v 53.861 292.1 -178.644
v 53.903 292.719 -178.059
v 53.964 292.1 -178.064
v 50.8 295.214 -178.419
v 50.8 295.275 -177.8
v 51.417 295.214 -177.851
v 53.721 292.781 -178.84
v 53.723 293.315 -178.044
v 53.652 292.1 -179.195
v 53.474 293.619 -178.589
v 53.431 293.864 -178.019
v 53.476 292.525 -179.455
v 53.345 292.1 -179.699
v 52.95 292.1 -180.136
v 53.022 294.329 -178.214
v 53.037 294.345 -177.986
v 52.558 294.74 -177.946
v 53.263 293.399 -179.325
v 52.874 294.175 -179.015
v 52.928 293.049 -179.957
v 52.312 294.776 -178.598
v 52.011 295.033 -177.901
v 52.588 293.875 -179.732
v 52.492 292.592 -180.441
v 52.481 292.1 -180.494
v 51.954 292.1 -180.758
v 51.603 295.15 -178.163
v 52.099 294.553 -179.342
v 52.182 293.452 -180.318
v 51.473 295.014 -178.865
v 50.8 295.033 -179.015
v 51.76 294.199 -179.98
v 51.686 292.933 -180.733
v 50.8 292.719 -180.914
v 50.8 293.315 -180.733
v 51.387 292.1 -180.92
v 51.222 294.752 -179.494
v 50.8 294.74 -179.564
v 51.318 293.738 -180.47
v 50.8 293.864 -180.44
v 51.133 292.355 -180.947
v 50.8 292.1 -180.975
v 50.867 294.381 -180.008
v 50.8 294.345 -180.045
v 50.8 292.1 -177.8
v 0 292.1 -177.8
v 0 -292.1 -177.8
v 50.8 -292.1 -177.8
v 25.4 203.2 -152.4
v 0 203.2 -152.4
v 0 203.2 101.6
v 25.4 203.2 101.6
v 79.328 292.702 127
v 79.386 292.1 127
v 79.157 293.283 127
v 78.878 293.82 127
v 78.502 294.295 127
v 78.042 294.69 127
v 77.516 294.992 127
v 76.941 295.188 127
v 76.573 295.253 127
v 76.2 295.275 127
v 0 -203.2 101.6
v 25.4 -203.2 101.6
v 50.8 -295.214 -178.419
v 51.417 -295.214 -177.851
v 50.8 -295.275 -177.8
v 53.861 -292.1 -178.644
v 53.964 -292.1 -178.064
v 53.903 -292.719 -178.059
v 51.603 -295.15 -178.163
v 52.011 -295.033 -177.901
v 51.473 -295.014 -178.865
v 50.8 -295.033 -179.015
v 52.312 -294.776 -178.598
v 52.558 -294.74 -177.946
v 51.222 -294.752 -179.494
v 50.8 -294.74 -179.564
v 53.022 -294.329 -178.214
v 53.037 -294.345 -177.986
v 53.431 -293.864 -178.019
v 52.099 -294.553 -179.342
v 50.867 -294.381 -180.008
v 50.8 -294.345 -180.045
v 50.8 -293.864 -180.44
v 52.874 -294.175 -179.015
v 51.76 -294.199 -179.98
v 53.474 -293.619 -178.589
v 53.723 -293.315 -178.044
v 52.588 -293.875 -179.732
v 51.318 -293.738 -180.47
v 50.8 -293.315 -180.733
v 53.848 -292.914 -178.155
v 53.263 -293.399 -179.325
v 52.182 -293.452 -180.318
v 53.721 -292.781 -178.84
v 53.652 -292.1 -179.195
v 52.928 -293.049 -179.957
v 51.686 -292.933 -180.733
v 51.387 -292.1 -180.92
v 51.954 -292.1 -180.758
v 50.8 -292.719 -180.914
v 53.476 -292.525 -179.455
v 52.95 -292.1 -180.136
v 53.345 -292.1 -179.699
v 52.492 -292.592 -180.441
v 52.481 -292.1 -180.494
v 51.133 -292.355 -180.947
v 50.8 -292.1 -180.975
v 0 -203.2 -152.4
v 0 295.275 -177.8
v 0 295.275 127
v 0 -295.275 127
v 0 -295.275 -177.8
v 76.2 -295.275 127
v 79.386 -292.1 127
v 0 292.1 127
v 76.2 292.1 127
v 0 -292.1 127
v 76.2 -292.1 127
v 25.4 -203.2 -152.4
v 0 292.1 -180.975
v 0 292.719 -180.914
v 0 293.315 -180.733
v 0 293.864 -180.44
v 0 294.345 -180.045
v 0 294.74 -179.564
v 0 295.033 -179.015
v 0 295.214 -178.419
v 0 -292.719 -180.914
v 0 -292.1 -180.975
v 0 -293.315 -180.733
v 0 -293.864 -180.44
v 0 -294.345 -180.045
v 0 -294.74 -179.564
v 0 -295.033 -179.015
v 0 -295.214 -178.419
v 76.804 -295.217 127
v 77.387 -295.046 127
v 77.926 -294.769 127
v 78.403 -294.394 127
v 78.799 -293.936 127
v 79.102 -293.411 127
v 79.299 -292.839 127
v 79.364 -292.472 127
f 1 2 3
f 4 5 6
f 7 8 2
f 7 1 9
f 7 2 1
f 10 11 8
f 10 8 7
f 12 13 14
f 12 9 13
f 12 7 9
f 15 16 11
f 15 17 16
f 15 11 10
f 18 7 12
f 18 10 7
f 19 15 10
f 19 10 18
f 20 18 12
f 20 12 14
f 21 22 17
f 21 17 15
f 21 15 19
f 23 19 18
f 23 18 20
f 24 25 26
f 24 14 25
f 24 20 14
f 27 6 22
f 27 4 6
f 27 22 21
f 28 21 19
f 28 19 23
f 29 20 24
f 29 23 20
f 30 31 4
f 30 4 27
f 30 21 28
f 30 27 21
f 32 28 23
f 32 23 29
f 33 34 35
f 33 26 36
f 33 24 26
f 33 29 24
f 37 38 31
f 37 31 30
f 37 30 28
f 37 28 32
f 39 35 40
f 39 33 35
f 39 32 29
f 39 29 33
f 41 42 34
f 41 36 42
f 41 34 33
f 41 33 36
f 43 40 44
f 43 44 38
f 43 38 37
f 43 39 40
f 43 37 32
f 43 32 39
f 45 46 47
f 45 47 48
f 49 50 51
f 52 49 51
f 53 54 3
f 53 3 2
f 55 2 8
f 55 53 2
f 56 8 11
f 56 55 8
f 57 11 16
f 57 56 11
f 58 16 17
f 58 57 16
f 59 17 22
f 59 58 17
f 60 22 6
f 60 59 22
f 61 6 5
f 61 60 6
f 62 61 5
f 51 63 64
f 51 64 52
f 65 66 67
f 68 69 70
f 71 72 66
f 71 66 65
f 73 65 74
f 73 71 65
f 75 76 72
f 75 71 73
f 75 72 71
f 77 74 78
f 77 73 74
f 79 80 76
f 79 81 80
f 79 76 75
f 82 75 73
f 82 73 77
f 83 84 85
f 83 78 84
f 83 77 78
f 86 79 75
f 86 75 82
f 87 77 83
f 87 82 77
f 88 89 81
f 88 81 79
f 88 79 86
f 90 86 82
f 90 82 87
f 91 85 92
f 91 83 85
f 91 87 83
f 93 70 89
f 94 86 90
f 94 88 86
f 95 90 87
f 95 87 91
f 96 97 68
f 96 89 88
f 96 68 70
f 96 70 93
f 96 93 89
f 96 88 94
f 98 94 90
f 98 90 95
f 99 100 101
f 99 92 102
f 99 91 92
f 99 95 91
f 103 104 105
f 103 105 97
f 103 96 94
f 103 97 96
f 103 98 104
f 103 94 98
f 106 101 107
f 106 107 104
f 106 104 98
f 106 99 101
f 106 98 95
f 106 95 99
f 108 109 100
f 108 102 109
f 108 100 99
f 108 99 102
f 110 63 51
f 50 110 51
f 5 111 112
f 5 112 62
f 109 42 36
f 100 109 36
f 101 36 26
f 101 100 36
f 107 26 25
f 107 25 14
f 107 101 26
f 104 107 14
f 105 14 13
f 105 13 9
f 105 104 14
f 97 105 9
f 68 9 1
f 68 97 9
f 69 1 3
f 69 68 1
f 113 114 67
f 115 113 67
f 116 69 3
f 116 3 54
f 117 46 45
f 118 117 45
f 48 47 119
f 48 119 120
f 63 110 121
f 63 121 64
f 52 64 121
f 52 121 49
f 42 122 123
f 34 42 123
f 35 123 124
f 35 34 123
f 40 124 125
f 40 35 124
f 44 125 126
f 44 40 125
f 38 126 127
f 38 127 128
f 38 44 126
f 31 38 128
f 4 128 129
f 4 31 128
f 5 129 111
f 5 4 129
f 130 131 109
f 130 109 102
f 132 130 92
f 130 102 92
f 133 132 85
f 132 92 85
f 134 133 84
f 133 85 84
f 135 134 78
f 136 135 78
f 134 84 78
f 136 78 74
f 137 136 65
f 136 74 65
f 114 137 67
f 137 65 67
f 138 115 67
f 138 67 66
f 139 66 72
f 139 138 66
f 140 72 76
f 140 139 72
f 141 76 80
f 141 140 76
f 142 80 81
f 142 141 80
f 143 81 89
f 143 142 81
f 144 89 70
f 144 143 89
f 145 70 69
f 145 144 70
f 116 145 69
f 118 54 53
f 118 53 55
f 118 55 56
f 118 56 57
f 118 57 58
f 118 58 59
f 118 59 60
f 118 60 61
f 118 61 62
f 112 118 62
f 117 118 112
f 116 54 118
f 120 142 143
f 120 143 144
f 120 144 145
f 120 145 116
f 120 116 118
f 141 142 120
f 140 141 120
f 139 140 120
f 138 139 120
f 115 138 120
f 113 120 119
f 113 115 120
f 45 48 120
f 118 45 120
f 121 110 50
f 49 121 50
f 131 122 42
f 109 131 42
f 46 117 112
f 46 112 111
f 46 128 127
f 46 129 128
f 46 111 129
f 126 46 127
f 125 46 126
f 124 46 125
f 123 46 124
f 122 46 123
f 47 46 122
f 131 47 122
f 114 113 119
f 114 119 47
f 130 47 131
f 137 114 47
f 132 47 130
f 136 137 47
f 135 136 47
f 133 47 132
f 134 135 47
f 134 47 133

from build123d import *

# Parameters (mm, degrees)
SKETCH_W     = 406.4
SKETCH_H     = 254
PAD_DEPTH    = 25.4
PAD001_DEPTH = 292.1
THICKNESS_T  = 3.175


with BuildPart() as filter001:
    # Sketch → Pad (new body)
    with BuildSketch(Plane.YZ):
        with Locations((0, -25.4)):
            Rectangle(SKETCH_W, SKETCH_H)
    extrude(amount=PAD_DEPTH)


with BuildPart() as transition:
    # Sketch001 → Pad001 (new body, symmetric)
    with BuildSketch(Plane.XZ):
        Polygon((0, -177.8), (50.8, -177.8), (76.2, 127), (0, 127), align=None)
    extrude(amount=PAD001_DEPTH, both=True)

    # Thickness
    thickness_openings = [transition.faces().sort_by_distance(p)[0] for p in [
        (38.1, 0, 127),
        (0, 0, -25.4),
    ]]
    offset(amount=THICKNESS_T, openings=thickness_openings)


solid = Compound([filter001.part, transition.part])
